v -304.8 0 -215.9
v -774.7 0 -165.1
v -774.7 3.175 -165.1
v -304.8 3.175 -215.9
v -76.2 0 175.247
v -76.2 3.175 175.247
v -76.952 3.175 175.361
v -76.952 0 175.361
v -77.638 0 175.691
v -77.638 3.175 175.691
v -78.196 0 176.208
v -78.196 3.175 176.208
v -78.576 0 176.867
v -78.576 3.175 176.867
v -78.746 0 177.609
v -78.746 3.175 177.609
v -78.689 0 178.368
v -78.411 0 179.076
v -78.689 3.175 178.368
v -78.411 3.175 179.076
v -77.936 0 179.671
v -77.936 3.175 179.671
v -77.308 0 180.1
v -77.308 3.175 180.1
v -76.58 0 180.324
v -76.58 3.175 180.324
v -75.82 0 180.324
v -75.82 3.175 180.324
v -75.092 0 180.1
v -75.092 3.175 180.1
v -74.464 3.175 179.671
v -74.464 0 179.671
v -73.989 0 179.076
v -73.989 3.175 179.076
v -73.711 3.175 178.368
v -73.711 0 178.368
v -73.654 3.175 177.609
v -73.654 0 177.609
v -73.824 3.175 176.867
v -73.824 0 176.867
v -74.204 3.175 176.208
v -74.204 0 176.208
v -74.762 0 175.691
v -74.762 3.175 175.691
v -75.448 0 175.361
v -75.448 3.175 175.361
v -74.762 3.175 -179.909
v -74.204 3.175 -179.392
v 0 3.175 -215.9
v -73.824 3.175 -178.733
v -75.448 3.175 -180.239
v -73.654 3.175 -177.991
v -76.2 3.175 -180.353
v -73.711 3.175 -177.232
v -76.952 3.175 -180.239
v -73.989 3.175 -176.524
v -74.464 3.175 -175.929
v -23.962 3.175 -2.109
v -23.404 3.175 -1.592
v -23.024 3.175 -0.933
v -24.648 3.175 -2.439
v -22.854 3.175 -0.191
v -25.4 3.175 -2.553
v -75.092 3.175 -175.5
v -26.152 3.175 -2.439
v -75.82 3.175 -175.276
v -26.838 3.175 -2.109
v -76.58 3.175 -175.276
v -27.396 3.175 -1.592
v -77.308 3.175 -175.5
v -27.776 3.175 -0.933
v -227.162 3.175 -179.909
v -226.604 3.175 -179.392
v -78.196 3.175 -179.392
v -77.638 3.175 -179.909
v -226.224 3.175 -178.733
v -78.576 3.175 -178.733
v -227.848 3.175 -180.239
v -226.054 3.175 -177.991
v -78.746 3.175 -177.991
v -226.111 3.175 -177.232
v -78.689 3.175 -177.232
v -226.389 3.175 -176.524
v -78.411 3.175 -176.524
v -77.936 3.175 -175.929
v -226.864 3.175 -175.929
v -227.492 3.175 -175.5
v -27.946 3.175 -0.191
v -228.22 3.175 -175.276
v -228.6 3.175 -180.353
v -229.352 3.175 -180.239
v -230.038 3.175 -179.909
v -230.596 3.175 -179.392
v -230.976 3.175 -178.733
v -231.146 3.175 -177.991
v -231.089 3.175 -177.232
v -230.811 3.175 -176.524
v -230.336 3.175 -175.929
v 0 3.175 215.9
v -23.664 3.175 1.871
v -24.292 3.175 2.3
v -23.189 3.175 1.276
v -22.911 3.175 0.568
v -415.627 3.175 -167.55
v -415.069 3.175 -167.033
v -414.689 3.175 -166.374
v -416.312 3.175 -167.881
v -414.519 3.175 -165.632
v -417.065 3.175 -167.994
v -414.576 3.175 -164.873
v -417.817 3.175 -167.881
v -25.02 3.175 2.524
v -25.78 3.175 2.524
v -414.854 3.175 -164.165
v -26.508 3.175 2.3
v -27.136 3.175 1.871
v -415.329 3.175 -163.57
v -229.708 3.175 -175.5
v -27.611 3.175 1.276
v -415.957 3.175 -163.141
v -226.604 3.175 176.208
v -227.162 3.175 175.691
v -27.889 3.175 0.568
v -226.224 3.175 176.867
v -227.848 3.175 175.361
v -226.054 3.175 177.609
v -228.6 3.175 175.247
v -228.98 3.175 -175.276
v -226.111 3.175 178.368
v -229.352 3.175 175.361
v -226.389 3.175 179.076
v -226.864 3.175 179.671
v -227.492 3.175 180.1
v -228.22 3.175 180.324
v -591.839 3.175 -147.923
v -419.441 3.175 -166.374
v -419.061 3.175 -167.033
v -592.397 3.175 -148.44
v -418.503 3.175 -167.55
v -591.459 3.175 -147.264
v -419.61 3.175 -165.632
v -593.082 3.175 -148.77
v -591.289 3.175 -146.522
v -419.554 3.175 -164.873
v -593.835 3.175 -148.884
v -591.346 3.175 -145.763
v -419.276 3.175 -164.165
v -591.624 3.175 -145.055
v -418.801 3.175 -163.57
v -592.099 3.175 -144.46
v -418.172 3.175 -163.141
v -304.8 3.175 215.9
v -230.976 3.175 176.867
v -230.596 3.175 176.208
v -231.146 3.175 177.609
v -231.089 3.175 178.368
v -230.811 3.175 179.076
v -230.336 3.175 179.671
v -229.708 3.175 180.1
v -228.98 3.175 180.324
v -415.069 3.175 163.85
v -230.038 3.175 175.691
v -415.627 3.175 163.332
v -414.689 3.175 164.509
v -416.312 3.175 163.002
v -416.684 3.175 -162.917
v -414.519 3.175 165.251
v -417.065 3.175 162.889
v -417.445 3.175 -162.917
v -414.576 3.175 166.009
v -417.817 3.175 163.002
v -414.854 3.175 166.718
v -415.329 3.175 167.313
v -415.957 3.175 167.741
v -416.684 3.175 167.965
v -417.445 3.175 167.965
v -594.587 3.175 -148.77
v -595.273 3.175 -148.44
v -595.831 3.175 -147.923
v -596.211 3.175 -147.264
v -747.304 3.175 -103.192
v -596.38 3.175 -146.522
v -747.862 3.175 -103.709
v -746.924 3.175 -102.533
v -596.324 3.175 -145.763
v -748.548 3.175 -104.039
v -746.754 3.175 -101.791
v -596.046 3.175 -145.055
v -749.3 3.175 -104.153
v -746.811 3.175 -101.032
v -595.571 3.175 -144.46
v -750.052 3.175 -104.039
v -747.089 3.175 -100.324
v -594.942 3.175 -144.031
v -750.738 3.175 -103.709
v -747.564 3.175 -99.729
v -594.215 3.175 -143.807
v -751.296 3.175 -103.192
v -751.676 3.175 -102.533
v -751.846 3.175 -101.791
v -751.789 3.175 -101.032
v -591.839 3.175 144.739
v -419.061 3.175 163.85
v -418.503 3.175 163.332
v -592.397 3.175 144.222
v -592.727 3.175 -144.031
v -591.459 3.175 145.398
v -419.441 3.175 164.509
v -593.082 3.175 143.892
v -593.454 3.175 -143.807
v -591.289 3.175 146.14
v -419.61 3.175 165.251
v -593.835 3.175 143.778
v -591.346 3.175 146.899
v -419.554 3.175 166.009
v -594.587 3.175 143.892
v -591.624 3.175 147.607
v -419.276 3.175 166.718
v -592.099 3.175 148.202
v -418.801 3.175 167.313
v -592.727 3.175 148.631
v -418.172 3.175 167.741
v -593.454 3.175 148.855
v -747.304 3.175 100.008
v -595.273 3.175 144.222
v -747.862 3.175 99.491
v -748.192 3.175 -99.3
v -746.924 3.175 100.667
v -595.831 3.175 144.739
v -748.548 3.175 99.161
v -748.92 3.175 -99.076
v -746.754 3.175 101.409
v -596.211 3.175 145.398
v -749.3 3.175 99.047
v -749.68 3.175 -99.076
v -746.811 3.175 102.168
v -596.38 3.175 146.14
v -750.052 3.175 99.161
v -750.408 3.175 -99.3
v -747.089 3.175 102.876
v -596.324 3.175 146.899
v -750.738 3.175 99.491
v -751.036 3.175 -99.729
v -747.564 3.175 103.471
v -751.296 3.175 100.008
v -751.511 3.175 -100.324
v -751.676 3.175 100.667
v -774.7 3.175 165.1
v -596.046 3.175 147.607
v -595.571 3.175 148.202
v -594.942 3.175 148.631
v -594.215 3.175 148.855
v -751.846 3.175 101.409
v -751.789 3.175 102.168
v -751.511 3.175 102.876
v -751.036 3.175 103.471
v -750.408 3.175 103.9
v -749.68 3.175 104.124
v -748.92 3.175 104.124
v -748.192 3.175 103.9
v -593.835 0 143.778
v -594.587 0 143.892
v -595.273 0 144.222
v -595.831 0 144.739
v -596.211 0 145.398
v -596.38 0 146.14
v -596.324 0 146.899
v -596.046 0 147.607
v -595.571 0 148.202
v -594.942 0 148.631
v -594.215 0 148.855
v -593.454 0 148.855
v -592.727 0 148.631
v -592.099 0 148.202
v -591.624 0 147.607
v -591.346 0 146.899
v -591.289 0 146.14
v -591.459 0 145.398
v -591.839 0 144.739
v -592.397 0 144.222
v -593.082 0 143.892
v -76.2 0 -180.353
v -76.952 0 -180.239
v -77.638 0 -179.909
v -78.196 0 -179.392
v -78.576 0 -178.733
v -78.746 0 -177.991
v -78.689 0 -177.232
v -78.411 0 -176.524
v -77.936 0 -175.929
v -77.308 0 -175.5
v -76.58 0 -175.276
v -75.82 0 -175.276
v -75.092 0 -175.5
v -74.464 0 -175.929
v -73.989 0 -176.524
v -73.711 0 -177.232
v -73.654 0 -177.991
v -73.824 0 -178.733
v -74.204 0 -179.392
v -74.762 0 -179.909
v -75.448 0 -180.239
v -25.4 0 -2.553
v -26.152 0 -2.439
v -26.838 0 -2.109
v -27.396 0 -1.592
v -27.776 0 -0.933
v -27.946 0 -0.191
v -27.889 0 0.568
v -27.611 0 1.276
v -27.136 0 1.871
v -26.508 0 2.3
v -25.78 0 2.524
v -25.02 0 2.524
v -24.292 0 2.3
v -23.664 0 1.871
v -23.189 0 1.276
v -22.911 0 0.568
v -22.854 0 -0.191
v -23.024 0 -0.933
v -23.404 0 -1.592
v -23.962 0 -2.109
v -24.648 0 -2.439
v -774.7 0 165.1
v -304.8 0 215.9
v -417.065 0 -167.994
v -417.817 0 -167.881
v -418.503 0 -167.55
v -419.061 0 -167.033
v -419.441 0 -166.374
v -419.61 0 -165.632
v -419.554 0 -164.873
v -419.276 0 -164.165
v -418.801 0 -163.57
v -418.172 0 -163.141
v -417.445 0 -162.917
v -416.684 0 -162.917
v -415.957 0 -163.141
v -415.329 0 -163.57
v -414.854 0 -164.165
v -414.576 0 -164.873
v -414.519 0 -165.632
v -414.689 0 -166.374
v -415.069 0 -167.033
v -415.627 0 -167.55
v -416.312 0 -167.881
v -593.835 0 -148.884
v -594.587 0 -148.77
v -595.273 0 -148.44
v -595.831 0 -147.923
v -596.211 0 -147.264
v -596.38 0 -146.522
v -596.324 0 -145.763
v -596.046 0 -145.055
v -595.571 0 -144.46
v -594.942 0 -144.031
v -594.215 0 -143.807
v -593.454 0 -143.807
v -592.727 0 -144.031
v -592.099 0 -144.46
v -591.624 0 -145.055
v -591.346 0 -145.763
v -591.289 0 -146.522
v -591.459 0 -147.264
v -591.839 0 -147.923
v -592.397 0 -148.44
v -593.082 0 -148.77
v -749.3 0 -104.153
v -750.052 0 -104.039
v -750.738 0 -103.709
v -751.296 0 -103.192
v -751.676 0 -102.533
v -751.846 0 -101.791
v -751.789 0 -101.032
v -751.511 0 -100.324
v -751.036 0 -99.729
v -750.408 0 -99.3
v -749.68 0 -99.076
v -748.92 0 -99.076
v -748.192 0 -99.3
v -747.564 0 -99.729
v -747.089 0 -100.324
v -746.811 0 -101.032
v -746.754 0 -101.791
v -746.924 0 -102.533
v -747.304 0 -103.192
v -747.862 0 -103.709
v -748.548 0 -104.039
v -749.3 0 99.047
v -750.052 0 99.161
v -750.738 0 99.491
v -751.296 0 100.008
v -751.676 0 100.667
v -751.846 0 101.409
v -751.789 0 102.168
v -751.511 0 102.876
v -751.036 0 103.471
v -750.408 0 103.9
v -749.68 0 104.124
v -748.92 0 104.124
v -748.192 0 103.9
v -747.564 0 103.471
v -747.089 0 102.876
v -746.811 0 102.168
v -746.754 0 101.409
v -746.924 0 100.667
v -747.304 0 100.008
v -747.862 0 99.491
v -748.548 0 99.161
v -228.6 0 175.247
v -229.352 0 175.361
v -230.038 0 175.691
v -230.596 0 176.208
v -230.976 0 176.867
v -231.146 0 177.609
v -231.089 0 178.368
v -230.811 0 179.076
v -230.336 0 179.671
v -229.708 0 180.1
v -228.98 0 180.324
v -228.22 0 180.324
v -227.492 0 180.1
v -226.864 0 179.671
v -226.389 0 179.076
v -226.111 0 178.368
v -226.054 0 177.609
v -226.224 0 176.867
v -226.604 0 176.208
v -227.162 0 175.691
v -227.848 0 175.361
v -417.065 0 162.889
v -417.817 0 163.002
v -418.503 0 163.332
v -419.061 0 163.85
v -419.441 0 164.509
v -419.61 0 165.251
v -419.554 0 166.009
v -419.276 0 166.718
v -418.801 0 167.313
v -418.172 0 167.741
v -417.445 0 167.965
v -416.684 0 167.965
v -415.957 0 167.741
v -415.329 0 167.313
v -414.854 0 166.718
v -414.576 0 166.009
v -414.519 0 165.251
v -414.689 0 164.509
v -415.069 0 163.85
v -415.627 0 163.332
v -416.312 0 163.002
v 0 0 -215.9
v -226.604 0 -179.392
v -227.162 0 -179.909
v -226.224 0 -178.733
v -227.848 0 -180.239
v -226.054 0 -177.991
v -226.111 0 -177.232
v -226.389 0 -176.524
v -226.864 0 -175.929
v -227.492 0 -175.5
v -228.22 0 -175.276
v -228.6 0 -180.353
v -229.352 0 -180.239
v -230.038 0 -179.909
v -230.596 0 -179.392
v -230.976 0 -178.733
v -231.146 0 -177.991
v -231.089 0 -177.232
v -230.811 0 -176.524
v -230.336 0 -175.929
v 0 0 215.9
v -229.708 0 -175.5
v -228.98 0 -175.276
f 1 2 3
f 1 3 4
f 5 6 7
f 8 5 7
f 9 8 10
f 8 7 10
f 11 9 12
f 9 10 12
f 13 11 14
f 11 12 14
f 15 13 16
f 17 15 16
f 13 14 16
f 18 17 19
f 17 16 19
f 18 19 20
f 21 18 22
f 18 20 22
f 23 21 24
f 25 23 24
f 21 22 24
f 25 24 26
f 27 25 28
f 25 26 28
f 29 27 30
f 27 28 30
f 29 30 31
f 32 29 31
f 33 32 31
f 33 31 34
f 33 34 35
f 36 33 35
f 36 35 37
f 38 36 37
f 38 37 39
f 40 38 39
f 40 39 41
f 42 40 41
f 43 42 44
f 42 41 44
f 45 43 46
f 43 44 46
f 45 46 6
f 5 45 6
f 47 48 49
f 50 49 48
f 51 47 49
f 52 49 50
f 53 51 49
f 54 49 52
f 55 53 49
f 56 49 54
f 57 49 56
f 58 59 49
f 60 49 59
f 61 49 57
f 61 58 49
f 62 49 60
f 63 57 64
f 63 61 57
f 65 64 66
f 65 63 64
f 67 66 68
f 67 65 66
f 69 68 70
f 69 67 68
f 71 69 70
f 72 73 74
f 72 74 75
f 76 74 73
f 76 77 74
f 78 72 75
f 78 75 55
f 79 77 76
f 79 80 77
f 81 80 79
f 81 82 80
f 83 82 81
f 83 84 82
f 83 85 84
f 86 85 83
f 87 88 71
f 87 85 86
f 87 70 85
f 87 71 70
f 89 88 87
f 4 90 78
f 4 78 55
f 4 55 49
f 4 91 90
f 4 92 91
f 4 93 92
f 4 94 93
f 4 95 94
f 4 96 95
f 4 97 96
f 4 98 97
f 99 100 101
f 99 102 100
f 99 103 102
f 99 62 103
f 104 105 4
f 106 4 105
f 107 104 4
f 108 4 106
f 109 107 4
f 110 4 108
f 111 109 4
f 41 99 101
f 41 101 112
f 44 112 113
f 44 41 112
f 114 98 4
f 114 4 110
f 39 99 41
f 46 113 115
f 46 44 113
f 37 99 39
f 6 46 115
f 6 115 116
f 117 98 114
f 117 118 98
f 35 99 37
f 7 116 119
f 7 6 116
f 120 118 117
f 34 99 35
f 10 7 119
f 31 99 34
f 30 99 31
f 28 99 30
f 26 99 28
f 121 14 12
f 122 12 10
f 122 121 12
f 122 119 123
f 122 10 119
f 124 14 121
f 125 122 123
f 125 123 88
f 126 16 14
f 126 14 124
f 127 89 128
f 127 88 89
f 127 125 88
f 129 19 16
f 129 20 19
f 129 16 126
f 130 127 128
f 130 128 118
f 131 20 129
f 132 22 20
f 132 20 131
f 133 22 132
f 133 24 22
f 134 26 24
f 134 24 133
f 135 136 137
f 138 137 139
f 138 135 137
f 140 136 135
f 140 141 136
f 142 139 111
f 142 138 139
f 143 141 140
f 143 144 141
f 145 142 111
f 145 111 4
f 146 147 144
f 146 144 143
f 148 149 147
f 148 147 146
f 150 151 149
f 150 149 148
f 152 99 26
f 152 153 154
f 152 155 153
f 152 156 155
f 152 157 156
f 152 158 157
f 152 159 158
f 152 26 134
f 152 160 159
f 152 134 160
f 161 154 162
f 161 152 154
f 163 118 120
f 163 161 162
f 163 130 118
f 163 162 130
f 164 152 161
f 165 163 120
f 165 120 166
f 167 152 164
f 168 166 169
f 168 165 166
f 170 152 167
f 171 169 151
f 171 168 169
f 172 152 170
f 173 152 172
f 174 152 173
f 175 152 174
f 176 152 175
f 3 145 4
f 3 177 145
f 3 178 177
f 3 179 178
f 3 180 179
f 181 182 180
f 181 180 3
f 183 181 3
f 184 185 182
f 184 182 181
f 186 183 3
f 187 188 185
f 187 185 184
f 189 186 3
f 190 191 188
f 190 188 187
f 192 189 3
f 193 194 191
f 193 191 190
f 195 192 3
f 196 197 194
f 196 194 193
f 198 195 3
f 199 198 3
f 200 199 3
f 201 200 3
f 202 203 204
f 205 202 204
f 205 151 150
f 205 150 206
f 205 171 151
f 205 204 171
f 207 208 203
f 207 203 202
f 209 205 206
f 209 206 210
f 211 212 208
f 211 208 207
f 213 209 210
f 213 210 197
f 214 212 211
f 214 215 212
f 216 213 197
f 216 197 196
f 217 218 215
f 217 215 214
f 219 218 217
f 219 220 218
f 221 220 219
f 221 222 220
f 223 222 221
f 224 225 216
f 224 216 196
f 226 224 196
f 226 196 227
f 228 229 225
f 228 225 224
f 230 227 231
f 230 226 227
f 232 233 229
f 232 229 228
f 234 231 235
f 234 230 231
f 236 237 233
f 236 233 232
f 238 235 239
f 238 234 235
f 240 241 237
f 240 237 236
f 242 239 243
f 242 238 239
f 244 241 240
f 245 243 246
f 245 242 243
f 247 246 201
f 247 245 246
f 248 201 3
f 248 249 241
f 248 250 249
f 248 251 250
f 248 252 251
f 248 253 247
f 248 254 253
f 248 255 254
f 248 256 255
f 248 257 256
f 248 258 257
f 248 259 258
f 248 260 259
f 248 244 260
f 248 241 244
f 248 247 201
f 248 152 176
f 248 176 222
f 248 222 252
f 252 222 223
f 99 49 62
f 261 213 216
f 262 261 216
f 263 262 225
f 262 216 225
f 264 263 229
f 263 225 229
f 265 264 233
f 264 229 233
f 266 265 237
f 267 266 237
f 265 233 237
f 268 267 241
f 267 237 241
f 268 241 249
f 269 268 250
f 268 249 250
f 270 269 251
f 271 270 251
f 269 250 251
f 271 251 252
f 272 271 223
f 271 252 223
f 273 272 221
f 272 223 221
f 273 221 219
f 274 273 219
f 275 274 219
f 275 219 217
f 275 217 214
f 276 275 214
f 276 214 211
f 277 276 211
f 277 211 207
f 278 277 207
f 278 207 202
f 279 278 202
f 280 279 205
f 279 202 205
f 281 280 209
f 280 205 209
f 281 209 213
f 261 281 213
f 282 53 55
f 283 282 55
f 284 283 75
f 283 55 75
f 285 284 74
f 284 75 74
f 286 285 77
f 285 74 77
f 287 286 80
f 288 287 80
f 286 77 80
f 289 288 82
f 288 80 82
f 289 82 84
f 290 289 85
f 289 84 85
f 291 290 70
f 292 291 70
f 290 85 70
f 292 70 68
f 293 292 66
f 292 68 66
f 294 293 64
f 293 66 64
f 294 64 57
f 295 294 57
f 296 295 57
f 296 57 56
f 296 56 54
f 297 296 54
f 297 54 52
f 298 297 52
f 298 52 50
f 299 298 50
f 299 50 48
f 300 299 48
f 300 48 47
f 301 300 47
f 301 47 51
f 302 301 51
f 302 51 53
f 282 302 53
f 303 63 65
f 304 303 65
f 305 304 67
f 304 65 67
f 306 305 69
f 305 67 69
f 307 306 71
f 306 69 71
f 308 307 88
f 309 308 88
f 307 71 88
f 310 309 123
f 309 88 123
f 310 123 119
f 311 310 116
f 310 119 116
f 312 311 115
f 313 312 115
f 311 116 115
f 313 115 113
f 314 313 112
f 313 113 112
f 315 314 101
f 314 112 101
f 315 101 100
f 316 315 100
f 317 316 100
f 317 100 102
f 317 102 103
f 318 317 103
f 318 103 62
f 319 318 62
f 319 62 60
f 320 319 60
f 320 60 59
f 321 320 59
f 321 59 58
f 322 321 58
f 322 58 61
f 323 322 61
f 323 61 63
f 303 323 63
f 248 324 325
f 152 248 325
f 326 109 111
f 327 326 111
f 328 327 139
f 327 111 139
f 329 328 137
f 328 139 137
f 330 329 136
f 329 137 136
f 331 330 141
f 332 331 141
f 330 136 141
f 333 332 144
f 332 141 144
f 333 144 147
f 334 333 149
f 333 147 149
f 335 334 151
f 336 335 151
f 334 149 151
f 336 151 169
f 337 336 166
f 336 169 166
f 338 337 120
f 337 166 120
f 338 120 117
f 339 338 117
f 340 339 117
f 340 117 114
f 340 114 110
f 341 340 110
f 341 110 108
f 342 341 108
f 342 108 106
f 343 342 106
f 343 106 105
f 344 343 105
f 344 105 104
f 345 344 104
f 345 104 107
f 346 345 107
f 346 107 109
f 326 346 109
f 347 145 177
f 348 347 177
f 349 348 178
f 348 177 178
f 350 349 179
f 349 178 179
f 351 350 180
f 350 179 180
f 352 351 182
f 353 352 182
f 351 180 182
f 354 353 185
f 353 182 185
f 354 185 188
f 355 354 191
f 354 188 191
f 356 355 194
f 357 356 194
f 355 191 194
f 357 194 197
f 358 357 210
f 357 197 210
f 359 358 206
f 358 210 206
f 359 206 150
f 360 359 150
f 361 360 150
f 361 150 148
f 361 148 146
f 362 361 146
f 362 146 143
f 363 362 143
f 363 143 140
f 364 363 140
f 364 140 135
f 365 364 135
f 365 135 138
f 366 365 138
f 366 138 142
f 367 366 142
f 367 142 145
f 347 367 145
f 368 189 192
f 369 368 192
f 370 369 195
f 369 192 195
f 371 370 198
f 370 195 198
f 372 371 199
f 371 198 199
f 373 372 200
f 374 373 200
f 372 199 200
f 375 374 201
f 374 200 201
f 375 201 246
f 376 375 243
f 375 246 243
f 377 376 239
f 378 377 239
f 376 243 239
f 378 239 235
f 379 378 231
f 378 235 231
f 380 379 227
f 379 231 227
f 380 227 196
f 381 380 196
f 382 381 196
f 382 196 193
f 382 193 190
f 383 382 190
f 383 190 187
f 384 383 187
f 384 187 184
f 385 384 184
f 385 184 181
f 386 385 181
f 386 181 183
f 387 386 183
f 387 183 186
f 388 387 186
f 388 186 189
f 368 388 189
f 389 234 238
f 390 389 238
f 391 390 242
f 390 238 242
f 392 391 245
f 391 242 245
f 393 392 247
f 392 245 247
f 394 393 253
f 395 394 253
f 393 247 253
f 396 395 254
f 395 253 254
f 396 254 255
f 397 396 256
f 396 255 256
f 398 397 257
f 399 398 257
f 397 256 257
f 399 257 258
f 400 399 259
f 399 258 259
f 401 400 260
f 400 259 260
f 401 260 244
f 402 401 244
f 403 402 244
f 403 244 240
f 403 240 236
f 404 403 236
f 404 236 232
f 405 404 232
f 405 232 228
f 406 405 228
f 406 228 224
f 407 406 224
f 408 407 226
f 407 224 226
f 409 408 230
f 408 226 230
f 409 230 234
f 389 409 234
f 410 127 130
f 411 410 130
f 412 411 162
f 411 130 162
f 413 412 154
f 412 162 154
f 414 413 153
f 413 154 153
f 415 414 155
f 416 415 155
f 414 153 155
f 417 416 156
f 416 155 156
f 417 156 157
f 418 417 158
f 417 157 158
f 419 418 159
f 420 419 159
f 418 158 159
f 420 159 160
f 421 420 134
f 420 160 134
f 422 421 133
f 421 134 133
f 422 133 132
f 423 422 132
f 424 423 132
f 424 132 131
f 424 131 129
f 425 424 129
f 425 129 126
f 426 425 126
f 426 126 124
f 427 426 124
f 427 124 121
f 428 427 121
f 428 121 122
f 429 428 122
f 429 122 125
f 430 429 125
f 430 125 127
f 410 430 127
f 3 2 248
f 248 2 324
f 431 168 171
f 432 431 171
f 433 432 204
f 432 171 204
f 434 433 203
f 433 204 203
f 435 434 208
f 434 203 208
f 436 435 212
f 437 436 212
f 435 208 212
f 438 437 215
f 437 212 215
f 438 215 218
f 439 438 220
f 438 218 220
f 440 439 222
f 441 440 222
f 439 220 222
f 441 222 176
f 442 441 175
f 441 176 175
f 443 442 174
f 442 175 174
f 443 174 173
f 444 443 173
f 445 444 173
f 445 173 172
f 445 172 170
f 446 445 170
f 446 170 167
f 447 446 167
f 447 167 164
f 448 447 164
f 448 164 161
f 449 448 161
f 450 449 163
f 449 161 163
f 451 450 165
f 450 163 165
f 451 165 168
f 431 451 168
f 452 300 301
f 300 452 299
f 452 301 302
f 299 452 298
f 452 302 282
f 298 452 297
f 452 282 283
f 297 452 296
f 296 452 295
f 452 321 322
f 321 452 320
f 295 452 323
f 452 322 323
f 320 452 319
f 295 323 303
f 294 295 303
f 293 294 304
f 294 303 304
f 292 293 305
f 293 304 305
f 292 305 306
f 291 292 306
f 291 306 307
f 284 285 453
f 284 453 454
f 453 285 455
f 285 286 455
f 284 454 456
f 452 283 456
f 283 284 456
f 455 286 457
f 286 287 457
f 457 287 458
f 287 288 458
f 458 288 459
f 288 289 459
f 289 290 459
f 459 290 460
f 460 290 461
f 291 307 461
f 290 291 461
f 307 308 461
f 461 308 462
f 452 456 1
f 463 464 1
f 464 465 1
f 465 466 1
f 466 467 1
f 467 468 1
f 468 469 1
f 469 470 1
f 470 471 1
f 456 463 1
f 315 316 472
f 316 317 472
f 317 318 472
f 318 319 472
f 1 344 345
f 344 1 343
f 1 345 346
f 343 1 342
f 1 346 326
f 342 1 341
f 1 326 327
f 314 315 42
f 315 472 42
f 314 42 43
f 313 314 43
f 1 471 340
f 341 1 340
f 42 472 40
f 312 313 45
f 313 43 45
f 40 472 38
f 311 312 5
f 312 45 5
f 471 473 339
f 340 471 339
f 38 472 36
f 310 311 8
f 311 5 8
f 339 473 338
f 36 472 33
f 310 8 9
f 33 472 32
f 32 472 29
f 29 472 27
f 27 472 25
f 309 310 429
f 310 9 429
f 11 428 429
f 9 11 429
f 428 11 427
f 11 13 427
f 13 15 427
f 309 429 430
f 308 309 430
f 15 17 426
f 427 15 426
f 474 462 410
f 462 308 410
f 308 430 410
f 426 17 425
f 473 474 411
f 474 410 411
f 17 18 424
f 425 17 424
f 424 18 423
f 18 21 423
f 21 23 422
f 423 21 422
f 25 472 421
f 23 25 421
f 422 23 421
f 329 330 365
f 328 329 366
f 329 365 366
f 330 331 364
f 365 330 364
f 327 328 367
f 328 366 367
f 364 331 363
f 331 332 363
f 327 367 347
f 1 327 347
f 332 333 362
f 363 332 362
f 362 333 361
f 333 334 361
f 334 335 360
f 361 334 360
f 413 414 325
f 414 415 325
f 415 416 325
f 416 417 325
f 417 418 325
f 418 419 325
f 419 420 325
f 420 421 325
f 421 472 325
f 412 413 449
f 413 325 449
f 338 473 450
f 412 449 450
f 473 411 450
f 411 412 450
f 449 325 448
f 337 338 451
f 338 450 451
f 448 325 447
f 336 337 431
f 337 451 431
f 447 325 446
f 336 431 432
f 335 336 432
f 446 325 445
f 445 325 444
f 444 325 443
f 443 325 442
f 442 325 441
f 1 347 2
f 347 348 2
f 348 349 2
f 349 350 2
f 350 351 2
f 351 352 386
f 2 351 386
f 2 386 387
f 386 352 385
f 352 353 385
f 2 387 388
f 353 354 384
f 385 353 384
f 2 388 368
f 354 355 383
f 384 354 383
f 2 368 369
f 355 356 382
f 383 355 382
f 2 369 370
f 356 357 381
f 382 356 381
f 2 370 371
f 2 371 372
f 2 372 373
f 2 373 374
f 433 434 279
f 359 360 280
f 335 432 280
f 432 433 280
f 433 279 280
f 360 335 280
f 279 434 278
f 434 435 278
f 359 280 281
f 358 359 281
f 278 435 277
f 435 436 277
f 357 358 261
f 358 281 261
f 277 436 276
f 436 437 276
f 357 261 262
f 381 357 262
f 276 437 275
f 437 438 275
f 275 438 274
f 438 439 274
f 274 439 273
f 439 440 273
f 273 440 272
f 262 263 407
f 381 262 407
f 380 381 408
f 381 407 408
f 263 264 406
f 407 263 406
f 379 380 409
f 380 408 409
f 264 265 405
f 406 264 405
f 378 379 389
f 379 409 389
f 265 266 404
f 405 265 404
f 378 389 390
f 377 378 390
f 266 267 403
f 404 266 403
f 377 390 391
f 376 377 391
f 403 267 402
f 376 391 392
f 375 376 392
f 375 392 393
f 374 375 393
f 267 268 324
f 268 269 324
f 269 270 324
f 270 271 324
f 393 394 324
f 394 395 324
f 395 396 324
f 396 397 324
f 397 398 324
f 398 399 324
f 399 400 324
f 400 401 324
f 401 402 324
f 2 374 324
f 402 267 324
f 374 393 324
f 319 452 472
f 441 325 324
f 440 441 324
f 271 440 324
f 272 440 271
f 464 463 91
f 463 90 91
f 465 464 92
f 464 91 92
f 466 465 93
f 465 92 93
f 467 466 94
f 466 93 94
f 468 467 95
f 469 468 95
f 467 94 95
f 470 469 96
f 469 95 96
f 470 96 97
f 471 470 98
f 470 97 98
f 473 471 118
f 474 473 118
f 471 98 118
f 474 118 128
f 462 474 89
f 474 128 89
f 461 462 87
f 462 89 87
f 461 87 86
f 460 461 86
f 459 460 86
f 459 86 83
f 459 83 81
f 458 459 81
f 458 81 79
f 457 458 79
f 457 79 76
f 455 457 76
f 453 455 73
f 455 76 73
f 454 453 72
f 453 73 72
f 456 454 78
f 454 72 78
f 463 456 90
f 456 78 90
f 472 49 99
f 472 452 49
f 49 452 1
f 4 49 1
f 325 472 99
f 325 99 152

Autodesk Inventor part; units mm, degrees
ref_plane "YZ Plane" through (0, 0, 0) normal (1, 0, 0) x (0, 1, 0)
ref_plane "XZ Plane" through (0, 0, 0) normal (0, 1, 0) x (-1, 0, 0)
ref_plane "XY Plane" through (0, 0, 0) normal (0, 0, 1) x (1, 0, 0)
sketch "Sketch1" plane through (0, 0, 0) normal (0, 1, 0) x (-1, 0, 0)
  line L0 (0, 0) -> (0, 215.9)
  line L1 (0, 215.9) -> (304.8, 215.9)
  line L2 (0, 0) -> (774.7, 0)
  line L3 (0, 0) -> (0, -215.9)
  line L4 (0, -215.9) -> (304.8, -215.9)
  line L5 (774.7, 0) -> (774.7, -165.1)
  line L6 (774.7, -165.1) -> (774.7, 0)
  line L7 (774.7, 0) -> (774.7, 165.1)
  line L8 (774.7, 165.1) -> (304.8, 215.9)
  line L9 (774.7, -165.1) -> (304.8, -215.9)
  line L10 (0, -215.9) -> (76.2, -215.9)
  line L11 (76.2, -215.9) -> (76.2, -177.8)
  line L12 (304.8, -215.9) -> (228.6, -215.9)
  line L13 (228.6, -215.9) -> (228.6, -177.8)
  line L14 (774.7, 0) -> (774.7, -101.6)
  line L15 (774.7, -101.6) -> (749.3, -101.6)
  line L16 (774.7, 0) -> (774.7, 101.6)
  line L17 (774.7, 101.6) -> (749.3, 101.6)
  line L18 (0, 215.9) -> (76.2, 215.9)
  line L19 (76.2, 215.9) -> (76.2, 177.8)
  line L20 (304.8, 215.9) -> (228.6, 215.9)
  line L21 (228.6, 215.9) -> (228.6, 177.8)
  line L22 (0, 0) -> (25.4, 0)
  line L23 (774.7, -165.1) -> (597.93, -184.2103)
  line L24 (597.93, -184.2103) -> (593.8349, -146.331)
  line L25 (597.93, -184.2103) -> (421.16, -203.3205)
  line L26 (421.16, -203.3205) -> (417.0649, -165.4413)
  line L27 (774.7, 165.1) -> (597.93, 184.2103)
  line L28 (597.93, 184.2103) -> (593.8349, 146.331)
  line L29 (597.93, 184.2103) -> (421.16, 203.3205)
  line L30 (421.16, 203.3205) -> (417.0649, 165.4413)
  dimension "d0" = 215.9
  dimension "d1" = 304.8
  dimension "d2" = 774.7
  dimension "d3" = 215.9
  dimension "d4" = 304.8
  dimension "d5" = 165.1
  dimension "d6" = 165.1
  dimension "d9" = 76.2
  dimension "d10" = 38.1
  dimension "d11" = 76.2
  dimension "d12" = 38.1
  dimension "d15" = 101.6
  dimension "d16" = 25.4
  dimension "d17" = 101.6
  dimension "d18" = 25.4
  dimension "d23" = 76.2
  dimension "d24" = 38.1
  dimension "d25" = 76.2
  dimension "d26" = 38.1
  dimension "d32" = 25.4
  dimension "d34" = 177.8
  dimension "d35" = 38.1
  dimension "d36" = 177.8
  dimension "d37" = 38.1
  dimension "d38" = 177.8
  dimension "d39" = 38.1
  dimension "d40" = 177.8
  dimension "d41" = 38.1
extrude "Extrusion1" add sketch "Sketch1" along normal blind 3.175
hole "Hole1" at (-593.8349, 0, -146.331) at (-417.0649, 0, -165.4413) at (-228.6, 0, -177.8) at (-76.2, 0, -177.8) at (-76.2, 0, 177.8) at (-228.6, 0, 177.8) at (-417.0649, 0, 165.4413) at (-593.8349, 0, 146.331) at (-749.3, 0, 101.6) at (-749.3, 0, -101.6) at (-25.4, 0, 0) direction (0, 1, 0) diameter 5.1054 end through all clearance for "Flat Head Machine Screw (82)" size "#10" standard "Ansi Unified Screw Threads"
properties part number "frontfloorfit2"
